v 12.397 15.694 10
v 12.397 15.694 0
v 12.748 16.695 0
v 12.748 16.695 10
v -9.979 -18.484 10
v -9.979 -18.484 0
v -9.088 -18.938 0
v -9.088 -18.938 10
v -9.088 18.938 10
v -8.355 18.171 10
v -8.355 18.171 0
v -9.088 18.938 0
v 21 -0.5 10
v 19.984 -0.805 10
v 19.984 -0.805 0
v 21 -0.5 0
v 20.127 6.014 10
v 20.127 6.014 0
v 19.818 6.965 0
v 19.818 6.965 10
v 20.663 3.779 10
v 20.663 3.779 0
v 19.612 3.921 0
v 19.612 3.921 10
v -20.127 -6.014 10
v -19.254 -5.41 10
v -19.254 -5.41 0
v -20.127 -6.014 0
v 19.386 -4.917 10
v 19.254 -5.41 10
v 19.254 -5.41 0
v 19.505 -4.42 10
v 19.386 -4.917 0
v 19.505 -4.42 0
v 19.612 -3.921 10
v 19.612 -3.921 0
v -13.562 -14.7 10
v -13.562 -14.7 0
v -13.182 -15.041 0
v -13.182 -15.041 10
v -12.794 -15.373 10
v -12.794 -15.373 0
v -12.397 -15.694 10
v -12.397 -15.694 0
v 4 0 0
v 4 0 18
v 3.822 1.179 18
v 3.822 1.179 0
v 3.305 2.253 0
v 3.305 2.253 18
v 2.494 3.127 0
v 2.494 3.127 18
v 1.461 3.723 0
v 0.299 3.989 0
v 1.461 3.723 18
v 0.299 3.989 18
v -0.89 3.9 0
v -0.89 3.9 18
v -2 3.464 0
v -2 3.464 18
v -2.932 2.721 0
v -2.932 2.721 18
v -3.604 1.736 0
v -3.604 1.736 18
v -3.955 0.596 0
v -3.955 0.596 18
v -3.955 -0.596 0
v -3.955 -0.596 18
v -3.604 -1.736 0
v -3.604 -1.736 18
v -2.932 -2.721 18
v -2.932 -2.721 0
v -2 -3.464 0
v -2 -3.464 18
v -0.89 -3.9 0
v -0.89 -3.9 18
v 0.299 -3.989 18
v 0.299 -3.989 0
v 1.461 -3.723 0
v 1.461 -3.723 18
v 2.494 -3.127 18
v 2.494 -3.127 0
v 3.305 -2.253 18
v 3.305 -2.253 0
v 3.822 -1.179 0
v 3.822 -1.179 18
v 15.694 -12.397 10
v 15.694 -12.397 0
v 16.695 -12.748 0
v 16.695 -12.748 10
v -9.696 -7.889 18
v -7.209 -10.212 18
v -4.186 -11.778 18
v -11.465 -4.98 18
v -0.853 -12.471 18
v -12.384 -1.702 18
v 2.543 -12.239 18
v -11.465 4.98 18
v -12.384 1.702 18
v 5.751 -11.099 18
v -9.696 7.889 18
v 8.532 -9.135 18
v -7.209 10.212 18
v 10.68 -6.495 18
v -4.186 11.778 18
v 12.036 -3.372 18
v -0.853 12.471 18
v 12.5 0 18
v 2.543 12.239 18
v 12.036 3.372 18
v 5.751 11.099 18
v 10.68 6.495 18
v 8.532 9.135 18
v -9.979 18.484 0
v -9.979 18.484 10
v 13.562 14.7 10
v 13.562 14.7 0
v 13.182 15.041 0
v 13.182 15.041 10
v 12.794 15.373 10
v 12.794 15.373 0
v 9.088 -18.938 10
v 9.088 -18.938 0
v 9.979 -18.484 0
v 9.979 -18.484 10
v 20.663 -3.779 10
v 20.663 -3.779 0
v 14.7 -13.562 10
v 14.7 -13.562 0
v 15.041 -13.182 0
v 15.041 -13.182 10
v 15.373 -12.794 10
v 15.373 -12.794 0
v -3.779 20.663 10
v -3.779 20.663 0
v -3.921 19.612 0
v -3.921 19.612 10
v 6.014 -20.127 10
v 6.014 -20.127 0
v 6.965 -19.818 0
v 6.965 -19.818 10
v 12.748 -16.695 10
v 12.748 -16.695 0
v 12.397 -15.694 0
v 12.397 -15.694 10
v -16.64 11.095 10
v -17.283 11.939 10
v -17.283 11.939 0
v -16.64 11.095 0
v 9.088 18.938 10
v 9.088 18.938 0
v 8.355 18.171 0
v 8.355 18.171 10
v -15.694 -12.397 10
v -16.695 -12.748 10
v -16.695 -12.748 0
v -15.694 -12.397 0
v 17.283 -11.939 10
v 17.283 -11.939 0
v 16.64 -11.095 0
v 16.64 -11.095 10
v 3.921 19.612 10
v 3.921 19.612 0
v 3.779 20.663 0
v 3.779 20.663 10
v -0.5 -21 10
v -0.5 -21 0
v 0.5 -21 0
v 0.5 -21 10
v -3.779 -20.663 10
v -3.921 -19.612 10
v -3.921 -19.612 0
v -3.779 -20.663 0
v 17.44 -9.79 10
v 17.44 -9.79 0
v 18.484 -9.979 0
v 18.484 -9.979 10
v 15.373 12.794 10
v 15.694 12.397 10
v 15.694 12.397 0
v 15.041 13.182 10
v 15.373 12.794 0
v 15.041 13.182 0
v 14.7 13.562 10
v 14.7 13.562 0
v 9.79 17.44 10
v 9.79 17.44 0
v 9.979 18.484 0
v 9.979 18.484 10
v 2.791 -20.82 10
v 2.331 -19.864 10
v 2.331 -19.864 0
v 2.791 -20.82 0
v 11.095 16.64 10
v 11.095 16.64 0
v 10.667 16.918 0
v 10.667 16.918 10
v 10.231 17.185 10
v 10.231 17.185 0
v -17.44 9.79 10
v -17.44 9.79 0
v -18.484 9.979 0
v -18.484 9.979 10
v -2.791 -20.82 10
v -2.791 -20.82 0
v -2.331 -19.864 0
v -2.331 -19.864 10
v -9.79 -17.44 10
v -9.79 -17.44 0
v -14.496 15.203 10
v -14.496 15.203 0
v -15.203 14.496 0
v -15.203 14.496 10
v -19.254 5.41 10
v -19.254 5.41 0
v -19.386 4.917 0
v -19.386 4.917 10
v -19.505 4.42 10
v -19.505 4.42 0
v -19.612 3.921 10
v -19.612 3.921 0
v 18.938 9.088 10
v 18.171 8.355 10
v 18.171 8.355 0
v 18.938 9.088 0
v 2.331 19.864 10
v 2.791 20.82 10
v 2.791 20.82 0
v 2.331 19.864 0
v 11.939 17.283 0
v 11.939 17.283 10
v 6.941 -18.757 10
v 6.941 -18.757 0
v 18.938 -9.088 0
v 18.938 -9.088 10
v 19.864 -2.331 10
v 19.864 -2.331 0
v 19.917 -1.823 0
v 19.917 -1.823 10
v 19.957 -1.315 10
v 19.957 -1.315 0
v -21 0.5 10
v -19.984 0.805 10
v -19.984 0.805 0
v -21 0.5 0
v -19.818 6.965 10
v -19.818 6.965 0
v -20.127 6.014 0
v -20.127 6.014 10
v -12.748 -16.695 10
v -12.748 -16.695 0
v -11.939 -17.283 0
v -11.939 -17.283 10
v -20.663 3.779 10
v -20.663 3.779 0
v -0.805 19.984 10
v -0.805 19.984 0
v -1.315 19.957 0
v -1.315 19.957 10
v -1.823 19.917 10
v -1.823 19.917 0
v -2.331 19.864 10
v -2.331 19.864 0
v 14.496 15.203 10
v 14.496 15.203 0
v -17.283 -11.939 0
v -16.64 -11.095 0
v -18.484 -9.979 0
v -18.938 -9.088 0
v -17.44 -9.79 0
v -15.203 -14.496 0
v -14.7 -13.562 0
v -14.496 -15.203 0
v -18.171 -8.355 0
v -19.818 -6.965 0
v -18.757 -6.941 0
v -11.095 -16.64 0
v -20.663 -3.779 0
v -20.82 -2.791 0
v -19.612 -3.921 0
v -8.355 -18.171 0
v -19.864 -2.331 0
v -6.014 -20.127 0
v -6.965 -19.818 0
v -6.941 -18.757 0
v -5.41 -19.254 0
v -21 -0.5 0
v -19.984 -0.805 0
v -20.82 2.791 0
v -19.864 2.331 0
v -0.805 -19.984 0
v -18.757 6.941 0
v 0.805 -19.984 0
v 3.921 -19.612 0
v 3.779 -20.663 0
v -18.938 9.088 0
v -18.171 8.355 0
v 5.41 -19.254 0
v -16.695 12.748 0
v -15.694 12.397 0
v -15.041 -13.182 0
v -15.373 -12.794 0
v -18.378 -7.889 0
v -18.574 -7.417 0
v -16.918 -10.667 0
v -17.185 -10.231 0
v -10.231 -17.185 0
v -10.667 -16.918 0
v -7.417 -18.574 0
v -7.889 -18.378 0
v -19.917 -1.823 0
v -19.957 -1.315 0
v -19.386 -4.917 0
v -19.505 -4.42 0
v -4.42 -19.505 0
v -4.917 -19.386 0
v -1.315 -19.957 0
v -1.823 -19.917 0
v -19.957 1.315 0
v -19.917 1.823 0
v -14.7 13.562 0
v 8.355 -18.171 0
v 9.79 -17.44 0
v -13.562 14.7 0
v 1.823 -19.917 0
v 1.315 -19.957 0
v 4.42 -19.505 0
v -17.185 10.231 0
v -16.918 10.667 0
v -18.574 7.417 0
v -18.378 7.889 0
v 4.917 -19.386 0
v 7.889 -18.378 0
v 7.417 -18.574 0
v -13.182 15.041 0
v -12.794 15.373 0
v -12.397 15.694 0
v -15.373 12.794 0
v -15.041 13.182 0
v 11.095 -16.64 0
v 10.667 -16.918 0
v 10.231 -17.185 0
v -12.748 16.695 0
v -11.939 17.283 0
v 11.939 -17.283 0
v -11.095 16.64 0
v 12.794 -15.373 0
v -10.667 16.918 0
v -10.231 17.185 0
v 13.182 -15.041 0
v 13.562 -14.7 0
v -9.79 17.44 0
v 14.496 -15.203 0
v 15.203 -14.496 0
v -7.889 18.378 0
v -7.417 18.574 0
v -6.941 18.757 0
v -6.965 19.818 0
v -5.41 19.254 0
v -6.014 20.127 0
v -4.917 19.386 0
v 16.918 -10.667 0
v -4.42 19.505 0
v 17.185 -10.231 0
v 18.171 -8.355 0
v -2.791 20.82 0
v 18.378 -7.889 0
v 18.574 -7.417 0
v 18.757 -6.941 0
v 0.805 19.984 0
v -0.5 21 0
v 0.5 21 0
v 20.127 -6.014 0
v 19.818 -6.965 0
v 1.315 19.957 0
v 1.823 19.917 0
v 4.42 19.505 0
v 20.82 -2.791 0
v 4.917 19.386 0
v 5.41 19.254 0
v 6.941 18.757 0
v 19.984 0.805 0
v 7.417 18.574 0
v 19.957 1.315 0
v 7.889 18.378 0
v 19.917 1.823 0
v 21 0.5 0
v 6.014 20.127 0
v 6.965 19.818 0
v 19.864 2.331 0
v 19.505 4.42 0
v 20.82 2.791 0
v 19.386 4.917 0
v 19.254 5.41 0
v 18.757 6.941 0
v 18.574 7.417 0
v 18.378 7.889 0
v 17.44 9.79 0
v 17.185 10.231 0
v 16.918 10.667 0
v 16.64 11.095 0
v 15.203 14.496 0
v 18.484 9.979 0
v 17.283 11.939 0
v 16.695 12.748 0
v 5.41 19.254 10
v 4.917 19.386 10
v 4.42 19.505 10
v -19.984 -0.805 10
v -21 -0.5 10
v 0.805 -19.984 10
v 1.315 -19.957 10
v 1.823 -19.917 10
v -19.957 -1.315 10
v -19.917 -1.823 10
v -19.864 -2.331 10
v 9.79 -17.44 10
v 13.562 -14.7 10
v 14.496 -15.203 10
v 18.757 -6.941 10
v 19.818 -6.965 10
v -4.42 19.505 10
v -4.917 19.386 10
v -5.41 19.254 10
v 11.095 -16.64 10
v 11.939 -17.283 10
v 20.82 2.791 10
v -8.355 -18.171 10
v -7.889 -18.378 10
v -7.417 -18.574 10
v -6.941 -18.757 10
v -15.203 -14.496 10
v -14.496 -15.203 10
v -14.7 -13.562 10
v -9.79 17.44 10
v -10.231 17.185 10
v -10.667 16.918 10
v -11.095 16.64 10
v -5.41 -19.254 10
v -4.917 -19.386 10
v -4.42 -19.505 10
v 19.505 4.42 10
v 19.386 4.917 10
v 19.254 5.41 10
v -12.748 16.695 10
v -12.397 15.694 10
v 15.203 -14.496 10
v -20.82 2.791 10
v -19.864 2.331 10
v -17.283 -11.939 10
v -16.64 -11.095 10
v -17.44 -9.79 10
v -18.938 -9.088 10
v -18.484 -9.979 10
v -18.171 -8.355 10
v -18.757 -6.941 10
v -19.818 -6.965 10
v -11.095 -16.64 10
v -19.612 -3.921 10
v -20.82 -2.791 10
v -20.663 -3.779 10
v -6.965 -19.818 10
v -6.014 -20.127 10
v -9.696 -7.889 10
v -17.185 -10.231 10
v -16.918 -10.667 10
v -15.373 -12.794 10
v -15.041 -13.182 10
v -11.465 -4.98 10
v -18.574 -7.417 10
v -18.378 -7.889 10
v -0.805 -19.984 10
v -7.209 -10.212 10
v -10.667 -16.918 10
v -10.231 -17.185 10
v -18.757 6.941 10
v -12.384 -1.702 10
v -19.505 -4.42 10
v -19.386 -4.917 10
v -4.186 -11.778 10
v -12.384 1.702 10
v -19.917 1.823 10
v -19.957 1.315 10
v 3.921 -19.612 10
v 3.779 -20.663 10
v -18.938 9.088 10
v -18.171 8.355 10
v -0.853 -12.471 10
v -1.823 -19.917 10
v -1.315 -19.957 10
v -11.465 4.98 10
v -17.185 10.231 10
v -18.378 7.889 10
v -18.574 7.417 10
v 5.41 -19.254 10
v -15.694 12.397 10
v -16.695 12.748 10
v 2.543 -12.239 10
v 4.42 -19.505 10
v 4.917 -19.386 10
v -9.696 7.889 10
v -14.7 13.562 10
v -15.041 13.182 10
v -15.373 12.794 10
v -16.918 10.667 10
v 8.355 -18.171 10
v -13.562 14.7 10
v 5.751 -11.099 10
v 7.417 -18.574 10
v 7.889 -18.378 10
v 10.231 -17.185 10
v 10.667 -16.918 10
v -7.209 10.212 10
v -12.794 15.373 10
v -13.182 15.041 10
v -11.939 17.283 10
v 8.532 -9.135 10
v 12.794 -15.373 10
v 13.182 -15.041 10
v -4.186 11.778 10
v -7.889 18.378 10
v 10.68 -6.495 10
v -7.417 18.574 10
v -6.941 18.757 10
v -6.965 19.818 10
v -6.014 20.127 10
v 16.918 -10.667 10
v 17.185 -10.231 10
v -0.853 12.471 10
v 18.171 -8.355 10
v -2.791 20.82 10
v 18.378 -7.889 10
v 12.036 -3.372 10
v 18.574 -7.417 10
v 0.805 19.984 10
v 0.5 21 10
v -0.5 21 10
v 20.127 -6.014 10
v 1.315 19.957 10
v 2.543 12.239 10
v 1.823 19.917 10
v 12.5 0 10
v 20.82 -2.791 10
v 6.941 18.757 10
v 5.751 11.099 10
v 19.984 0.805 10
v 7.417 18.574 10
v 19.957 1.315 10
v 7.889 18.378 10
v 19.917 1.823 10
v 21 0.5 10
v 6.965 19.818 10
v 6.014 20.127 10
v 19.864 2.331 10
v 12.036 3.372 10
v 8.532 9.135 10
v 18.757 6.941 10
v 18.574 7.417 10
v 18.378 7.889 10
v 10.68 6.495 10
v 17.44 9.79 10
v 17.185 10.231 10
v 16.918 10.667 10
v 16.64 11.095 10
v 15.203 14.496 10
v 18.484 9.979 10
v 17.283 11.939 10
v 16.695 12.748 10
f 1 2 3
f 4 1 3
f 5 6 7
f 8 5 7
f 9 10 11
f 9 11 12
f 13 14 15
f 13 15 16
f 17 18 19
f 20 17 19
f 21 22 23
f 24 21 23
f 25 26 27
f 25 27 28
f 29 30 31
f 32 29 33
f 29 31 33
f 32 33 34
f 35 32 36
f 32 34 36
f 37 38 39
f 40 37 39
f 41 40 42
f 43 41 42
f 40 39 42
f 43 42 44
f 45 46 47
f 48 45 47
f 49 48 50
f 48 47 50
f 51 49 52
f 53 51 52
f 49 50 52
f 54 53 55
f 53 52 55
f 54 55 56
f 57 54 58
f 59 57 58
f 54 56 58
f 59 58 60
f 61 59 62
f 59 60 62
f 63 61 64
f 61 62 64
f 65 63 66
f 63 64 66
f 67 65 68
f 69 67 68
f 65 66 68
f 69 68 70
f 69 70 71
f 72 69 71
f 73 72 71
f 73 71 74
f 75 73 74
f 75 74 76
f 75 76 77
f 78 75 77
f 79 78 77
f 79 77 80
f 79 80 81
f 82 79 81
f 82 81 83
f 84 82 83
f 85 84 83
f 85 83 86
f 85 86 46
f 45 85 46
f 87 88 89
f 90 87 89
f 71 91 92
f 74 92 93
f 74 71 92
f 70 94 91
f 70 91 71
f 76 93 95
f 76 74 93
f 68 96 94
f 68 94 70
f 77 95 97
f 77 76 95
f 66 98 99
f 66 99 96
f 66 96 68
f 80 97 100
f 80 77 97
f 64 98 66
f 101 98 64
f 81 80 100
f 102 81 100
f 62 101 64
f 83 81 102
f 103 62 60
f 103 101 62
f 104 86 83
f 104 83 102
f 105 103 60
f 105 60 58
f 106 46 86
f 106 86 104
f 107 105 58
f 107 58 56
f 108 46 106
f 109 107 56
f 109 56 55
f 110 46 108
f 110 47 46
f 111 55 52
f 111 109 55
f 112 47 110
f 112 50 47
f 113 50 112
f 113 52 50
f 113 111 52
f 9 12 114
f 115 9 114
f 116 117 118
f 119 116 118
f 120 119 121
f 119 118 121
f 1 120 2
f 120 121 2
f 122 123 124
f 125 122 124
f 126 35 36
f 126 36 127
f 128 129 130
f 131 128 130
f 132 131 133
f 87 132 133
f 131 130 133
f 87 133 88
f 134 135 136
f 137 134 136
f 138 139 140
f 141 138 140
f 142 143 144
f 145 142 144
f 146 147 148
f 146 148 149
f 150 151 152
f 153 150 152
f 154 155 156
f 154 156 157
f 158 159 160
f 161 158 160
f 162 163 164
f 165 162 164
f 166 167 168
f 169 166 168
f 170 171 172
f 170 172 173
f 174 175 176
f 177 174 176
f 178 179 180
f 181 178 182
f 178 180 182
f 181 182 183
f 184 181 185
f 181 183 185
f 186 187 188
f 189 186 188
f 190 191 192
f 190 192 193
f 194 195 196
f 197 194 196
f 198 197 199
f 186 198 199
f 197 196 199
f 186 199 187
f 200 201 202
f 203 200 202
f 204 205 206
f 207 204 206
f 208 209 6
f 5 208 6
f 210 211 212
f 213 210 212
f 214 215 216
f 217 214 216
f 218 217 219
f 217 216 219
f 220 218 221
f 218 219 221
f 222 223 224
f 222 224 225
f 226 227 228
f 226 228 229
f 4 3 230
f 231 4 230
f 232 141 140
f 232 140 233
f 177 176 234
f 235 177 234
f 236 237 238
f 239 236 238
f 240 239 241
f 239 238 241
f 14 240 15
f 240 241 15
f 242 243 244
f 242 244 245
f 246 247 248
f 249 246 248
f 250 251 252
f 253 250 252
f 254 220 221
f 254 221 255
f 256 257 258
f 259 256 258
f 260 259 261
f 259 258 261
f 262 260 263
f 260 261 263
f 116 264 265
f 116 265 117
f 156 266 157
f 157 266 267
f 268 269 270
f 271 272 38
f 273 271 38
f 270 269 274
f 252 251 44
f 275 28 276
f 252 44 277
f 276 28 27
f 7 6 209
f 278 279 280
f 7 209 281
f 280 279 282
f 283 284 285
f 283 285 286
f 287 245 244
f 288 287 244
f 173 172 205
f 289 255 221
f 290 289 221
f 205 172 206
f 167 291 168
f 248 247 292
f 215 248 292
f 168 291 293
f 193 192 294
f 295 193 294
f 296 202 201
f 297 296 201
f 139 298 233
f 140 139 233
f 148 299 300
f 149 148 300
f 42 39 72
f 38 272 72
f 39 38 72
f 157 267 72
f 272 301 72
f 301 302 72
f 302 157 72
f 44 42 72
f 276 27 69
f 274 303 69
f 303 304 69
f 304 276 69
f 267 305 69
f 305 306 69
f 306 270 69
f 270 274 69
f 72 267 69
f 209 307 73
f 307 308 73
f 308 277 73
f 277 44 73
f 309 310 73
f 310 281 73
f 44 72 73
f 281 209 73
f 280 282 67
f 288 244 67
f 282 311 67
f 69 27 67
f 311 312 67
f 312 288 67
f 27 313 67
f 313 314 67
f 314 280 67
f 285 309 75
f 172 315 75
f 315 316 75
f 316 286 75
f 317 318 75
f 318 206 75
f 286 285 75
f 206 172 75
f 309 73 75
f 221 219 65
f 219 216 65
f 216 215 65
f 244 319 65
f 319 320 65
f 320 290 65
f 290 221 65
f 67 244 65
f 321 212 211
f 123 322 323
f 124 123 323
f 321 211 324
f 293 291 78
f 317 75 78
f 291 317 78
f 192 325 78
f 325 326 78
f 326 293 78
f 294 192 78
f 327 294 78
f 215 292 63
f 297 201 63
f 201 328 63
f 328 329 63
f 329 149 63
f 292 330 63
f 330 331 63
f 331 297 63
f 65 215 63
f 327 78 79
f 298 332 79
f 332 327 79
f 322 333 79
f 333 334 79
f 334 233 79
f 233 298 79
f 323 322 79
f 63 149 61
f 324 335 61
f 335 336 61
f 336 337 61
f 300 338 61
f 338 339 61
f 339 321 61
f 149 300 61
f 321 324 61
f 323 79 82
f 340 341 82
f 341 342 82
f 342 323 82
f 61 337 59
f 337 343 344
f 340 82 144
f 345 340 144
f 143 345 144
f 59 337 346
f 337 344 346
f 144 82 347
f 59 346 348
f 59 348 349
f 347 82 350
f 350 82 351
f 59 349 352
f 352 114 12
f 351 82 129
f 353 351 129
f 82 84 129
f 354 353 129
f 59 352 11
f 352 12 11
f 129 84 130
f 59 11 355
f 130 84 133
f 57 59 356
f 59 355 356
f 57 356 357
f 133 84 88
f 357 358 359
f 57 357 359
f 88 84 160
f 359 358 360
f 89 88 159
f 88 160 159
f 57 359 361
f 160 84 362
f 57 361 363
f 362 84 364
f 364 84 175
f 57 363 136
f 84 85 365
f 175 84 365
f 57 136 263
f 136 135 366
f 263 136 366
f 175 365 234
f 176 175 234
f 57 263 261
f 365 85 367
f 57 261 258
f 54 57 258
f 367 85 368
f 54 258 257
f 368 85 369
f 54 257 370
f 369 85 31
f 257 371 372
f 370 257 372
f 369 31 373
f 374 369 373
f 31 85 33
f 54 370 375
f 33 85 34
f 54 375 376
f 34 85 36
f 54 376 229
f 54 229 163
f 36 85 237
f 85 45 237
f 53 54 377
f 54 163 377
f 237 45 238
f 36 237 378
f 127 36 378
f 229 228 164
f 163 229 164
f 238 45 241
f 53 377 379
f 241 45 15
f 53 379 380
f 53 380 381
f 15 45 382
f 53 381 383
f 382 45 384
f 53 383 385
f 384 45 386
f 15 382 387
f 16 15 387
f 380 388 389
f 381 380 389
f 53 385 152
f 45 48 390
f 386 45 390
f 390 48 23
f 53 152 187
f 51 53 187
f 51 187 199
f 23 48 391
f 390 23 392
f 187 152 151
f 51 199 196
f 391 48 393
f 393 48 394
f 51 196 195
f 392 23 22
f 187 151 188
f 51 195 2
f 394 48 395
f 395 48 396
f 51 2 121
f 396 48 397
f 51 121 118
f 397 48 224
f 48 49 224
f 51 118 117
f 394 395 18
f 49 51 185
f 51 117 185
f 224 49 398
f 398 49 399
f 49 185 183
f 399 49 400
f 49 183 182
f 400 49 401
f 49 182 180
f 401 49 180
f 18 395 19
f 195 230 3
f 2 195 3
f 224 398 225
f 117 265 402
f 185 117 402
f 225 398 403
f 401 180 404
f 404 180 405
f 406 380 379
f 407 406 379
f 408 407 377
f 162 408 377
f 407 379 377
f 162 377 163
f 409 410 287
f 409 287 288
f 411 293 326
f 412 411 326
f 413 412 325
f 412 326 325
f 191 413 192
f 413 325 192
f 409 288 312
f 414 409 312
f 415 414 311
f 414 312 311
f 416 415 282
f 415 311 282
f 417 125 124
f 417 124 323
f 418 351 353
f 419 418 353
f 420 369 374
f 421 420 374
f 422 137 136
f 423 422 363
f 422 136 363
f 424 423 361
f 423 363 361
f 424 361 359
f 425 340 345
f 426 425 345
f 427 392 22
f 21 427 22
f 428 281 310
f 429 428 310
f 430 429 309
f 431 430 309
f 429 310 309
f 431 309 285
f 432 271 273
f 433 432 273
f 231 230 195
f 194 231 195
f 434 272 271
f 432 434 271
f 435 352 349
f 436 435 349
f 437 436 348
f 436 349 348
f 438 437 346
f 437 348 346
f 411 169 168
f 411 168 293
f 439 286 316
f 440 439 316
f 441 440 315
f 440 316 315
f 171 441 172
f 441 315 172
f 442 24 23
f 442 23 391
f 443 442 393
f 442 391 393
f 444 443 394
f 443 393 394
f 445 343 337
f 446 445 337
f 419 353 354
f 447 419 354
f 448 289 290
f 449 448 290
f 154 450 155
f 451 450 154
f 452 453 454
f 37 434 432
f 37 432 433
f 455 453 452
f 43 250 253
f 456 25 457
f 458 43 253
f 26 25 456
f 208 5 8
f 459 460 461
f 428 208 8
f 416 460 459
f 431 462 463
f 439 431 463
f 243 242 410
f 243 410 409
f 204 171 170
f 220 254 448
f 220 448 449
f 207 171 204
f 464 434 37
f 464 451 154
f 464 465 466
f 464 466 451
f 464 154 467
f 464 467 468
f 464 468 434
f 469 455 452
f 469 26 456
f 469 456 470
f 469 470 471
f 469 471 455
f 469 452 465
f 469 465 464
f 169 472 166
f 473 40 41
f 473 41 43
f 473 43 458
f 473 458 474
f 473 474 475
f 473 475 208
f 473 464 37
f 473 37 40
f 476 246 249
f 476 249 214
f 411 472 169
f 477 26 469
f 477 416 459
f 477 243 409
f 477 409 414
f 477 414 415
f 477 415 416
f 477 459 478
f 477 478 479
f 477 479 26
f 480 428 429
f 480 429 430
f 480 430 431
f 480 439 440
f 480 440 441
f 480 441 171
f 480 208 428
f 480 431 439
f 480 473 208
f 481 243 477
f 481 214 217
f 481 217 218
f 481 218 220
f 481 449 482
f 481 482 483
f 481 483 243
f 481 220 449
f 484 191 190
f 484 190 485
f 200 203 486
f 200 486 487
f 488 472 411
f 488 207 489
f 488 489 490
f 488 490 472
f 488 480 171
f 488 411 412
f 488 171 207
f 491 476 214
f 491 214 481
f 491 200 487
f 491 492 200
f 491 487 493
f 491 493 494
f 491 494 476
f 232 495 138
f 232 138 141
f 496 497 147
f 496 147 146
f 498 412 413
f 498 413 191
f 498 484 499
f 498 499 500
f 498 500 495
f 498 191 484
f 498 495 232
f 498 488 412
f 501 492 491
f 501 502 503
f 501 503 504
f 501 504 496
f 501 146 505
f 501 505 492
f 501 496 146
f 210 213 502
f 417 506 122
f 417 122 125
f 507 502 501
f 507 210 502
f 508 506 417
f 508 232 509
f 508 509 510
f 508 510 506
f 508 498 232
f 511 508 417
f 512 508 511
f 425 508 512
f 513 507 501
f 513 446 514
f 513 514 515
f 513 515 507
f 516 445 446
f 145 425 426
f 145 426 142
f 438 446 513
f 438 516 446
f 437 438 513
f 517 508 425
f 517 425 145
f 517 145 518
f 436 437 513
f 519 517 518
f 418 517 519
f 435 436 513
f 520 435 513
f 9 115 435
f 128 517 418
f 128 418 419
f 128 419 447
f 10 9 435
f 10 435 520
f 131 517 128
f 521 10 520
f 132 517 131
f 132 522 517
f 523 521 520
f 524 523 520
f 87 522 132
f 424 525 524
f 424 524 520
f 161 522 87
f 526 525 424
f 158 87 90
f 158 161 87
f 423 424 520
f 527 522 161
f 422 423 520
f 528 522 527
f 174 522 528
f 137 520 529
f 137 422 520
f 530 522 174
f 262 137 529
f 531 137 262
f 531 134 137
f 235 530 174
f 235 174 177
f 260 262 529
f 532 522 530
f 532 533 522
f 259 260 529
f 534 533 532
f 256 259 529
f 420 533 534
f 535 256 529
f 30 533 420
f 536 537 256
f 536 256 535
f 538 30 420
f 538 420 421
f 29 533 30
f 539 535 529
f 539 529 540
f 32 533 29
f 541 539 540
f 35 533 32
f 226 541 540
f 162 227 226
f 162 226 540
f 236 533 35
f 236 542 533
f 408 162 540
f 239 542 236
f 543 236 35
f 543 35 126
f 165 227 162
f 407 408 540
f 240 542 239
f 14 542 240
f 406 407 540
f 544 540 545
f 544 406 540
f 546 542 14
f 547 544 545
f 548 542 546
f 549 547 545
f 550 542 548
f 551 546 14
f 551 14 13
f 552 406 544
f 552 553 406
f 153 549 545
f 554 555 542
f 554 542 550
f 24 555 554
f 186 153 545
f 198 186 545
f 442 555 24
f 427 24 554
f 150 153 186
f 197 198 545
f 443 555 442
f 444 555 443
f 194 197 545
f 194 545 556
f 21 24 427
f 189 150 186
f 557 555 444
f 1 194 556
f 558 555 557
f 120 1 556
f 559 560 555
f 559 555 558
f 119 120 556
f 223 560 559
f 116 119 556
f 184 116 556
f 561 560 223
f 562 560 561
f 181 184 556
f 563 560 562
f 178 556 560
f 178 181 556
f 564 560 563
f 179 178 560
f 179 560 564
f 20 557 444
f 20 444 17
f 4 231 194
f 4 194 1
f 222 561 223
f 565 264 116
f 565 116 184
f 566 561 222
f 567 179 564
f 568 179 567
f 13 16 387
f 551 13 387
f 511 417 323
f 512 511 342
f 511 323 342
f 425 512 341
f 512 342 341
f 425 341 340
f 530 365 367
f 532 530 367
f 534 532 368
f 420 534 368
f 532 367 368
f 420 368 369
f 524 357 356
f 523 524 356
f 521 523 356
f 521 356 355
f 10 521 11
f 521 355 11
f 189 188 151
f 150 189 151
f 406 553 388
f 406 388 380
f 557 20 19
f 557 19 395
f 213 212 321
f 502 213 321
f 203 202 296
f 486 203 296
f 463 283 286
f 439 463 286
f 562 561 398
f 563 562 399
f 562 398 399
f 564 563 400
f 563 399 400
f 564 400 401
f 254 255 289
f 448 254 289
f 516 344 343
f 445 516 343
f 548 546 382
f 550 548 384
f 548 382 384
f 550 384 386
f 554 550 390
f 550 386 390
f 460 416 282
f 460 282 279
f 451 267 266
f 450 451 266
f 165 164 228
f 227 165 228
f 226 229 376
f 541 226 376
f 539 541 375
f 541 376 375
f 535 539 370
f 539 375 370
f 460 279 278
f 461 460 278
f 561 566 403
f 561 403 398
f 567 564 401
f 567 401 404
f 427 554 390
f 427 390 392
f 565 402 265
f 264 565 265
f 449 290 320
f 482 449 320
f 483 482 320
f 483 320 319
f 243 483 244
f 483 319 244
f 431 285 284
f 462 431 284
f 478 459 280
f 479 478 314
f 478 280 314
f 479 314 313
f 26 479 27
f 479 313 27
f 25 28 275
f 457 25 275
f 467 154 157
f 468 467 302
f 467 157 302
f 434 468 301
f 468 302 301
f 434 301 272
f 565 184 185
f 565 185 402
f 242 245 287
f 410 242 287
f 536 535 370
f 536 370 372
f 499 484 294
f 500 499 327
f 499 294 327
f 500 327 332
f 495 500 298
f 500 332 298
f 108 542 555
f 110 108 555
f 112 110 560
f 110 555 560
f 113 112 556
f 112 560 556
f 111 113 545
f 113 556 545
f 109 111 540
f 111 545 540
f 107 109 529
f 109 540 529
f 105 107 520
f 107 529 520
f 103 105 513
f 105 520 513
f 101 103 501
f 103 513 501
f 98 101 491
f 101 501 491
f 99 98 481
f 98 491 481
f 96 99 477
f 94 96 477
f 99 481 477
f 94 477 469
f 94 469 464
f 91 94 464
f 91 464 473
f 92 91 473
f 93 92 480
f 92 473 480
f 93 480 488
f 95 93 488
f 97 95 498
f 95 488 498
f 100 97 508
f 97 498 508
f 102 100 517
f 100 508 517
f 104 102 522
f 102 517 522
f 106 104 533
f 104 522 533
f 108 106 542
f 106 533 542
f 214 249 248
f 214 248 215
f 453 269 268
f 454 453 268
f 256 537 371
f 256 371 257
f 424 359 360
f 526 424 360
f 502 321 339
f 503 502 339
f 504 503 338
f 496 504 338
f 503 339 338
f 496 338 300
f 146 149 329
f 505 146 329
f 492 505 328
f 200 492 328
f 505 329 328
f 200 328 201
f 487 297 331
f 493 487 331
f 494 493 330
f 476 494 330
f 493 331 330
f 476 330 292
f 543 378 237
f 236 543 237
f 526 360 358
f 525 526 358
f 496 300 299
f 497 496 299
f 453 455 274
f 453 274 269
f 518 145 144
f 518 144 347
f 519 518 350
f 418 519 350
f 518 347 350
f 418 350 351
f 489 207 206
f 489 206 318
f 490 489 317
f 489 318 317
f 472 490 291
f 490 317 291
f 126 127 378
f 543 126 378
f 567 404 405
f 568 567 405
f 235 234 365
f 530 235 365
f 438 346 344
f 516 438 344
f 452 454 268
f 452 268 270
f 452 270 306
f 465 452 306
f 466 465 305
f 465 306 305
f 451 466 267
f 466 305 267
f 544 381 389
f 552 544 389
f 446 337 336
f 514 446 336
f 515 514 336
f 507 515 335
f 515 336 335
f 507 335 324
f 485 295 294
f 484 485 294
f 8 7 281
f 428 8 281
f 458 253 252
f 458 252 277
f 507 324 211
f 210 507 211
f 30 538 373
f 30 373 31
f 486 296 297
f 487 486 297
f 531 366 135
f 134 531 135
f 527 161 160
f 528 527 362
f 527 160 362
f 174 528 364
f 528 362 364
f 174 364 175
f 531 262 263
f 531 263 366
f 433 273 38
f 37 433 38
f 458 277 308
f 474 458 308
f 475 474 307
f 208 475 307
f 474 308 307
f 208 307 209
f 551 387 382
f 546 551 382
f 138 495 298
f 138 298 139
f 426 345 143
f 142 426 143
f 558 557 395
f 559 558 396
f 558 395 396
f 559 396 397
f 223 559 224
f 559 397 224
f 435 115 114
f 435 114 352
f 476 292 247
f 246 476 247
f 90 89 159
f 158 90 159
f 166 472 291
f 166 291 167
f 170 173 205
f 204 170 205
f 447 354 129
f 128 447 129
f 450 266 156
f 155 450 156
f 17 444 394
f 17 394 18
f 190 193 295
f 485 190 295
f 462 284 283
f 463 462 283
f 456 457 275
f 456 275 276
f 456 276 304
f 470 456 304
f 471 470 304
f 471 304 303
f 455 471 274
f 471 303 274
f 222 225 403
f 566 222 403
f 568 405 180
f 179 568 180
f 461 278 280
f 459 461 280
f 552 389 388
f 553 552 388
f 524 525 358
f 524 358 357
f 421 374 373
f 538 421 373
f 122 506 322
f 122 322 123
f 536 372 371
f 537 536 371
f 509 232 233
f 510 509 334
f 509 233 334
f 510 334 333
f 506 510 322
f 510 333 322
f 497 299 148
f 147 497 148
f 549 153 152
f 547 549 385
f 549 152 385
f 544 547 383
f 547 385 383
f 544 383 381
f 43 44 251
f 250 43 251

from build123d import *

# Parameters (mm, degrees)
SKETCH_1_R               = 20
EXTRUDE_1_DEPTH          = 10
SKETCH_2_R               = 12.5
EXTRUDE_2_DEPTH          = 8
SKETCH_3_R               = 4
CUT_EXTRUDE_1_DEPTH      = 19
EXTRUDE_3_DEPTH          = 10
PATTERN_CIRCULAR_1_COUNT = 40


with BuildPart() as part:
    # 草圖1 → 填料-伸長1 (new body)
    with BuildSketch(Plane.XY):
        Circle(SKETCH_1_R)
    extrude(amount=EXTRUDE_1_DEPTH)

    # 草圖2 → 填料-伸長2 (add)
    with BuildSketch(Plane.XY.offset(10)):
        Circle(SKETCH_2_R)
    extrude(amount=EXTRUDE_2_DEPTH)

    # 草圖3 → 除料-伸長1 (cut, through all)
    with BuildSketch(Plane.XY.offset(18)):
        Circle(SKETCH_3_R)
    extrude(amount=-CUT_EXTRUDE_1_DEPTH, mode=Mode.SUBTRACT)

    # 草圖4 → 填料-伸長3 (add)
    with BuildSketch(Plane(origin=(0, 0, 0), x_dir=(-1, 0, 0), z_dir=(0, 0, -1))):
        Polygon((-0.5, 21), (0.5, 21), (2, 16), (-2, 16), align=None)
    extrude_3 = extrude(amount=-EXTRUDE_3_DEPTH)

    # 環狀複製排列1: 填料-伸長3 ×40 about axis
    pattern_circular_1_axis = Axis((0, 0, 0), (0, 0, 1))
    for i in range(1, PATTERN_CIRCULAR_1_COUNT):
        add(extrude_3.rotate(pattern_circular_1_axis, i * 360 / PATTERN_CIRCULAR_1_COUNT))


solid = part.part
